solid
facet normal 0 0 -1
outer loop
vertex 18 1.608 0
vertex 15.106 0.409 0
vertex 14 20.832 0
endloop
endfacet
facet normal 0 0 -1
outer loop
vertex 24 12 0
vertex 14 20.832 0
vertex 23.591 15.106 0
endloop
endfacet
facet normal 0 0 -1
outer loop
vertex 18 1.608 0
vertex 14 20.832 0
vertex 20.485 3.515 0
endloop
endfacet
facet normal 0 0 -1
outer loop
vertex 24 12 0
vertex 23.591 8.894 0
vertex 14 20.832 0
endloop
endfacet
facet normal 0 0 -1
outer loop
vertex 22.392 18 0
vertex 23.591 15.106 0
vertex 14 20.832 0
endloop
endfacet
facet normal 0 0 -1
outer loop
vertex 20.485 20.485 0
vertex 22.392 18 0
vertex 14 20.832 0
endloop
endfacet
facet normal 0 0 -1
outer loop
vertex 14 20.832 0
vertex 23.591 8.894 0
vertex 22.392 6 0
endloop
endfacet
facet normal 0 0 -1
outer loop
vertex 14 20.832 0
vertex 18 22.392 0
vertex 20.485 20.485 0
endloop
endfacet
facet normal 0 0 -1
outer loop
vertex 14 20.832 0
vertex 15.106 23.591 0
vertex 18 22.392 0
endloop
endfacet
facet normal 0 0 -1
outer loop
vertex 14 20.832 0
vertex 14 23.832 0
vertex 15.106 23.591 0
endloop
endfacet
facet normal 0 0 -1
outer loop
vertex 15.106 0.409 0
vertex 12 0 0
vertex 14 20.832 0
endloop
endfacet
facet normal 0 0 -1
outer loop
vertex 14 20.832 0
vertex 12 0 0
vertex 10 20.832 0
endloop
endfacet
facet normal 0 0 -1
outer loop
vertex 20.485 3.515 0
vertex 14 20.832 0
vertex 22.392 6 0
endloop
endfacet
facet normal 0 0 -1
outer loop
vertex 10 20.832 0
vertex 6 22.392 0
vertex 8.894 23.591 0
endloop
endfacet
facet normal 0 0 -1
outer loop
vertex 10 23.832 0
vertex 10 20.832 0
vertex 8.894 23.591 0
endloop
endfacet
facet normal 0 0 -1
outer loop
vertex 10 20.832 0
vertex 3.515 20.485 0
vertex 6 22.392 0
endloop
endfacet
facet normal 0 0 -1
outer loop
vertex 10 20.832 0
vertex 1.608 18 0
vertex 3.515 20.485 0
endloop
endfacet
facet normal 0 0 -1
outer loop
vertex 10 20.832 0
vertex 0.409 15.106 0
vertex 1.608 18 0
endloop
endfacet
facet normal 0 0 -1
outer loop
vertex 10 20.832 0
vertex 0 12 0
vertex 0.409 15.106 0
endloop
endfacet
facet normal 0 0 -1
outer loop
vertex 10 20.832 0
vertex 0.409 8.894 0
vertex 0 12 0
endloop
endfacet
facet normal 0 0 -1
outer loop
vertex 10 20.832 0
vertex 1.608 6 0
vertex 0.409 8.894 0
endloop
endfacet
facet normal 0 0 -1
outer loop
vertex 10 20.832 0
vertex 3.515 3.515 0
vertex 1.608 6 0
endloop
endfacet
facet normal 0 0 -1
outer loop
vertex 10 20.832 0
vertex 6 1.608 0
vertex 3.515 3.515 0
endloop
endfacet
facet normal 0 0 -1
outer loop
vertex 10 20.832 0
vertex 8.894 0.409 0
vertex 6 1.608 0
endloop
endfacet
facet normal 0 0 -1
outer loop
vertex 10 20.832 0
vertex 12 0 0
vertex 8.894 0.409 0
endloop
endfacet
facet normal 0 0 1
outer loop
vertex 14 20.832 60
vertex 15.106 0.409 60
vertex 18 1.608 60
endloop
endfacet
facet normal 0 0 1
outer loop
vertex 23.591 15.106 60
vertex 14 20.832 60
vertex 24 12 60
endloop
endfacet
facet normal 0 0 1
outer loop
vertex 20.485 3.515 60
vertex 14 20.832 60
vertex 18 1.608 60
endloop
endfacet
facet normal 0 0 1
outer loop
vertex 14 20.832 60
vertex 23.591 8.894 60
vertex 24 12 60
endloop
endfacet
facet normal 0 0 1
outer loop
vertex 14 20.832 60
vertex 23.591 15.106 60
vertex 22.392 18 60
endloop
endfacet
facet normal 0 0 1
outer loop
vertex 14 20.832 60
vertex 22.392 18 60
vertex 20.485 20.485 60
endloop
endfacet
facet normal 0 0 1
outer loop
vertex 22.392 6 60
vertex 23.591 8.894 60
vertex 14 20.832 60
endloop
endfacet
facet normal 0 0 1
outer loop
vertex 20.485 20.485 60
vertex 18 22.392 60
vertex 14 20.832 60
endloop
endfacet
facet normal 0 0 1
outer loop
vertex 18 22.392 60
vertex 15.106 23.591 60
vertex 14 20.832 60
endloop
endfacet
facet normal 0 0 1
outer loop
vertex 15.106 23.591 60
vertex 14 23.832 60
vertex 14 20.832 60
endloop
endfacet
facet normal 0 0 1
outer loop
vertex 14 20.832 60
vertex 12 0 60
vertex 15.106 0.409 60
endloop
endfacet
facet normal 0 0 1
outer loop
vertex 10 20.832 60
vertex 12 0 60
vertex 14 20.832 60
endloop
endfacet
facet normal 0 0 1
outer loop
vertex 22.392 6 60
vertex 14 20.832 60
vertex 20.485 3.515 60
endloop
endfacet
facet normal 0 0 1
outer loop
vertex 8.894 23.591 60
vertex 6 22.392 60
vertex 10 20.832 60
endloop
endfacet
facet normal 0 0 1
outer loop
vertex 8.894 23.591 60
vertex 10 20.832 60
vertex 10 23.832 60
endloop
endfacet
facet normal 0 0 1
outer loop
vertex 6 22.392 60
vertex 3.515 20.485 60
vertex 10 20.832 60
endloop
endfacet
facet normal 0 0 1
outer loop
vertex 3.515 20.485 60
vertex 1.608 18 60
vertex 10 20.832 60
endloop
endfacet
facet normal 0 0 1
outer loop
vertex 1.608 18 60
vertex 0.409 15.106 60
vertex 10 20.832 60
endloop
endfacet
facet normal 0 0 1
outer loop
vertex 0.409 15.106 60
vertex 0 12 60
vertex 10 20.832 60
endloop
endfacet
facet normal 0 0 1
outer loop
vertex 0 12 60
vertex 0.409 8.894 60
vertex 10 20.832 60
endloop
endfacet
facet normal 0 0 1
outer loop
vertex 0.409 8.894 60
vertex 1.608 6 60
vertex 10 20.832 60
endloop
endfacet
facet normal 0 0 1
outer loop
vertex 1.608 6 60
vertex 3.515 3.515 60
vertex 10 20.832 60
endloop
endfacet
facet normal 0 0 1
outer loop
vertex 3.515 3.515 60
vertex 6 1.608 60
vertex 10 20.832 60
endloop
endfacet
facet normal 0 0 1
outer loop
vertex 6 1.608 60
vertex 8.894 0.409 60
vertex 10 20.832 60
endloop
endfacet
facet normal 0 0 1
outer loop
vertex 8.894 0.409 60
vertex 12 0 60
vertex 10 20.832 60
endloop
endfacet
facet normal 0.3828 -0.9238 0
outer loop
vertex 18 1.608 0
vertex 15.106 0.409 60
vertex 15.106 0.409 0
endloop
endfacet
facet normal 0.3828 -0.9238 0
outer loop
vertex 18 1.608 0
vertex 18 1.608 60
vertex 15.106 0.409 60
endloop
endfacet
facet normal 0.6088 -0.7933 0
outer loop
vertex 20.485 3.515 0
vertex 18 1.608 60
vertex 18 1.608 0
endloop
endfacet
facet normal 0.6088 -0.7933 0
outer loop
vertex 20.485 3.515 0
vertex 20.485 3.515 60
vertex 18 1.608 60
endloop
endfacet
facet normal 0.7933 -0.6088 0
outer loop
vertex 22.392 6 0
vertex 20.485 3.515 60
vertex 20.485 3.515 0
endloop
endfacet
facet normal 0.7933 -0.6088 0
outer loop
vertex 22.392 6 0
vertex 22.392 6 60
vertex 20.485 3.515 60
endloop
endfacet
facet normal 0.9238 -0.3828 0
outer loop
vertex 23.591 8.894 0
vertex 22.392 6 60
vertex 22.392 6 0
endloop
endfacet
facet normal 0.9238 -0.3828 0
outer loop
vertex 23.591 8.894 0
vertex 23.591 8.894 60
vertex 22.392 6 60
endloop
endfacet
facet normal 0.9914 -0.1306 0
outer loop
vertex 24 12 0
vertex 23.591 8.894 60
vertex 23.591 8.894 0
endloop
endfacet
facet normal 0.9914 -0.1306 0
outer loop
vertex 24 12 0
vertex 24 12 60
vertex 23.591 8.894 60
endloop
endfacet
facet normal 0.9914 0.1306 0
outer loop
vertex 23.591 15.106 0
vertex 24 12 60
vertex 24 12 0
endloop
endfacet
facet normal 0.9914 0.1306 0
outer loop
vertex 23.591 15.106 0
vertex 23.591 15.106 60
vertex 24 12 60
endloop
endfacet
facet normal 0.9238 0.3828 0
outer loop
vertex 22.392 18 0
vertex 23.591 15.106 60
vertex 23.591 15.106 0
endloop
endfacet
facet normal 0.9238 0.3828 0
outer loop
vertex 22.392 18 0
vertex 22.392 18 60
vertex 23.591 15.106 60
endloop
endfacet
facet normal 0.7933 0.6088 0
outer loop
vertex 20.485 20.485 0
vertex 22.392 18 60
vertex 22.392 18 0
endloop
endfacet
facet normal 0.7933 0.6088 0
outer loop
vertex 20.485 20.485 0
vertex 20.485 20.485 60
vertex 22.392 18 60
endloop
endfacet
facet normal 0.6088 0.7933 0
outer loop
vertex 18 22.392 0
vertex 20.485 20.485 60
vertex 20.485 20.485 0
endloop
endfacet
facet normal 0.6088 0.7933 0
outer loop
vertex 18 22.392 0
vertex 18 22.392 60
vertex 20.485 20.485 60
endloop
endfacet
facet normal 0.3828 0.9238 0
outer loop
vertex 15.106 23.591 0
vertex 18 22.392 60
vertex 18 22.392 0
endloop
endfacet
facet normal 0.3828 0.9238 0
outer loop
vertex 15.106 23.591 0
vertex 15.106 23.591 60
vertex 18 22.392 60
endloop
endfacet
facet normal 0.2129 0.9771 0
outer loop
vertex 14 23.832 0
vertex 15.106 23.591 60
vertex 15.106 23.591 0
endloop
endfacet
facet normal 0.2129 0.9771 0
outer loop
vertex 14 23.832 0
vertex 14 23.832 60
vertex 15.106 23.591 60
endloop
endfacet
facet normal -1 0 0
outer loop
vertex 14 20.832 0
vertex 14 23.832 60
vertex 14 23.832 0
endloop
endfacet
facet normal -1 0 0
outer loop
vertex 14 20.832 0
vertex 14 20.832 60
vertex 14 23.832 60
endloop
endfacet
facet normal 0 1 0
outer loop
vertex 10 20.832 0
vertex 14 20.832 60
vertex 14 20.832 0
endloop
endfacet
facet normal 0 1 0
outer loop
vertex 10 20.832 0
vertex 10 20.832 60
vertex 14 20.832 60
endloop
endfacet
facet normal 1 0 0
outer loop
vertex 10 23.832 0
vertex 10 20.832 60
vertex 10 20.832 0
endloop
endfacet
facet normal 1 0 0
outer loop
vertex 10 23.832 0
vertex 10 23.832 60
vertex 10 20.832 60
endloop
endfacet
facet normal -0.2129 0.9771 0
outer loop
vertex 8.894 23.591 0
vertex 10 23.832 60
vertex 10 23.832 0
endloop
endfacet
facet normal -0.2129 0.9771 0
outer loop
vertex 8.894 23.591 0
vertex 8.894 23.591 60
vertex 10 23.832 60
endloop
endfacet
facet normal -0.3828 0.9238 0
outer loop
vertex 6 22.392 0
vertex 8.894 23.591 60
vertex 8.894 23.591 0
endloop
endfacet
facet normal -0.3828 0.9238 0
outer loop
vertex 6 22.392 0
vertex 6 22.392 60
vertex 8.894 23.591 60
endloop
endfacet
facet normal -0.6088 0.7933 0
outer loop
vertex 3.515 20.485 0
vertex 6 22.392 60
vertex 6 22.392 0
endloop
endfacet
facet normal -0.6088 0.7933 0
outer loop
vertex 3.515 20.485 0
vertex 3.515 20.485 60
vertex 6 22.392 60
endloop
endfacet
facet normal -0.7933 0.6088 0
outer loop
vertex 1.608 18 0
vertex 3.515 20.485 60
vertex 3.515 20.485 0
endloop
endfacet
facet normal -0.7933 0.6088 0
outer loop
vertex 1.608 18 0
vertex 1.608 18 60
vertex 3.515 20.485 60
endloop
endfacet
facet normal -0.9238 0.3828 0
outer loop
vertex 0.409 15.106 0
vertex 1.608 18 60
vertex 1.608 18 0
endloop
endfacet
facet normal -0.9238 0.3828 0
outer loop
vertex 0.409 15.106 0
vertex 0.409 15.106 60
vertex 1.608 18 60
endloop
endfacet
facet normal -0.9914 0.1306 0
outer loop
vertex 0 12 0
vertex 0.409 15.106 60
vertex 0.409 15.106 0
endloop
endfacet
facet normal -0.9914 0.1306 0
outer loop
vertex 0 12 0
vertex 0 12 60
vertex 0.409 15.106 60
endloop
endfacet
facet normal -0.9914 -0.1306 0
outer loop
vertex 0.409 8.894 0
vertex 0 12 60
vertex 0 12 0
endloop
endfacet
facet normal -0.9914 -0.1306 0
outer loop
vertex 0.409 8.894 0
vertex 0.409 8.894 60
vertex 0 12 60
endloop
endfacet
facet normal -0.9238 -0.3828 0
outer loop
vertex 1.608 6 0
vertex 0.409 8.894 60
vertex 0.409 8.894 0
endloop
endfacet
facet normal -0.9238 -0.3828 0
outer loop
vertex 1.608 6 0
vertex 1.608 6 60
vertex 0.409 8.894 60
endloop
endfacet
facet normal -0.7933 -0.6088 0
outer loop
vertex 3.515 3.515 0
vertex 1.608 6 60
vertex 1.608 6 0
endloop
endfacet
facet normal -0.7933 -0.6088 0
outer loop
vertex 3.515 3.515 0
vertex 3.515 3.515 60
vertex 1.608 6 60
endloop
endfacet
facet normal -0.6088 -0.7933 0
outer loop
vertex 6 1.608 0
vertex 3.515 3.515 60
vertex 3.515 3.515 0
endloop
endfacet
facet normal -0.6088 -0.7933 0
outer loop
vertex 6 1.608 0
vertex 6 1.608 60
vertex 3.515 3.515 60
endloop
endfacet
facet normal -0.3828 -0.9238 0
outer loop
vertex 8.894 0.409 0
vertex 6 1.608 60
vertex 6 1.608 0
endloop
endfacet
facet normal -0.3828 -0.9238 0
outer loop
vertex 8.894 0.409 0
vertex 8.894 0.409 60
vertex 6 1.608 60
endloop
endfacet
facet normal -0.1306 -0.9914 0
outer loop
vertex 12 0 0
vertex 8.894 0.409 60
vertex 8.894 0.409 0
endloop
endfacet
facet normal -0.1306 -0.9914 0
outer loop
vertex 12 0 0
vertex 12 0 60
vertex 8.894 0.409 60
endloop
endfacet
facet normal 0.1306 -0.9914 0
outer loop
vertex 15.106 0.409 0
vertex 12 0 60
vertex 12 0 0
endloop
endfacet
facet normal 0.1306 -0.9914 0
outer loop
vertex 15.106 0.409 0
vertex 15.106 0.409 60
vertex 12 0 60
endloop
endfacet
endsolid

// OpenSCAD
$fn = 32;

// ----------------------------------------------------------------------
// Keyway shaft: d24 shaft, key 4 x 3 mm
// ----------------------------------------------------------------------

// --- parameters (mm) ---
shaft_r = 12;             // shaft radius
key_w = 4;                // keyway width
key_d = 3;                // keyway depth below the surface line
plate_t = 60;             // shaft length, Z (extrusion height)

shaft_d = 2 * shaft_r;  // shaft diameter
circle_step = 15;  // polygon sampling step, degrees

profile = [[8.894, 23.591], [6, 22.392], [3.515, 20.485], [1.608, 18], [0.409, 15.106], [0, 12], [0.409, 8.894], [1.608, 6], [3.515, 3.515], [6, 1.608], [8.894, 0.409], [12, 0], [15.106, 0.409], [18, 1.608], [20.485, 3.515], [22.392, 6], [23.591, 8.894], [24, 12], [23.591, 15.106], [22.392, 18], [20.485, 20.485], [18, 22.392], [15.106, 23.591], [14, 23.832], [14, 20.832], [10, 20.832], [10, 23.832]];  // primary outline, 27 points, counter clockwise

// --- the one profile operation ---
linear_extrude(height = plate_t) polygon(points = profile);
